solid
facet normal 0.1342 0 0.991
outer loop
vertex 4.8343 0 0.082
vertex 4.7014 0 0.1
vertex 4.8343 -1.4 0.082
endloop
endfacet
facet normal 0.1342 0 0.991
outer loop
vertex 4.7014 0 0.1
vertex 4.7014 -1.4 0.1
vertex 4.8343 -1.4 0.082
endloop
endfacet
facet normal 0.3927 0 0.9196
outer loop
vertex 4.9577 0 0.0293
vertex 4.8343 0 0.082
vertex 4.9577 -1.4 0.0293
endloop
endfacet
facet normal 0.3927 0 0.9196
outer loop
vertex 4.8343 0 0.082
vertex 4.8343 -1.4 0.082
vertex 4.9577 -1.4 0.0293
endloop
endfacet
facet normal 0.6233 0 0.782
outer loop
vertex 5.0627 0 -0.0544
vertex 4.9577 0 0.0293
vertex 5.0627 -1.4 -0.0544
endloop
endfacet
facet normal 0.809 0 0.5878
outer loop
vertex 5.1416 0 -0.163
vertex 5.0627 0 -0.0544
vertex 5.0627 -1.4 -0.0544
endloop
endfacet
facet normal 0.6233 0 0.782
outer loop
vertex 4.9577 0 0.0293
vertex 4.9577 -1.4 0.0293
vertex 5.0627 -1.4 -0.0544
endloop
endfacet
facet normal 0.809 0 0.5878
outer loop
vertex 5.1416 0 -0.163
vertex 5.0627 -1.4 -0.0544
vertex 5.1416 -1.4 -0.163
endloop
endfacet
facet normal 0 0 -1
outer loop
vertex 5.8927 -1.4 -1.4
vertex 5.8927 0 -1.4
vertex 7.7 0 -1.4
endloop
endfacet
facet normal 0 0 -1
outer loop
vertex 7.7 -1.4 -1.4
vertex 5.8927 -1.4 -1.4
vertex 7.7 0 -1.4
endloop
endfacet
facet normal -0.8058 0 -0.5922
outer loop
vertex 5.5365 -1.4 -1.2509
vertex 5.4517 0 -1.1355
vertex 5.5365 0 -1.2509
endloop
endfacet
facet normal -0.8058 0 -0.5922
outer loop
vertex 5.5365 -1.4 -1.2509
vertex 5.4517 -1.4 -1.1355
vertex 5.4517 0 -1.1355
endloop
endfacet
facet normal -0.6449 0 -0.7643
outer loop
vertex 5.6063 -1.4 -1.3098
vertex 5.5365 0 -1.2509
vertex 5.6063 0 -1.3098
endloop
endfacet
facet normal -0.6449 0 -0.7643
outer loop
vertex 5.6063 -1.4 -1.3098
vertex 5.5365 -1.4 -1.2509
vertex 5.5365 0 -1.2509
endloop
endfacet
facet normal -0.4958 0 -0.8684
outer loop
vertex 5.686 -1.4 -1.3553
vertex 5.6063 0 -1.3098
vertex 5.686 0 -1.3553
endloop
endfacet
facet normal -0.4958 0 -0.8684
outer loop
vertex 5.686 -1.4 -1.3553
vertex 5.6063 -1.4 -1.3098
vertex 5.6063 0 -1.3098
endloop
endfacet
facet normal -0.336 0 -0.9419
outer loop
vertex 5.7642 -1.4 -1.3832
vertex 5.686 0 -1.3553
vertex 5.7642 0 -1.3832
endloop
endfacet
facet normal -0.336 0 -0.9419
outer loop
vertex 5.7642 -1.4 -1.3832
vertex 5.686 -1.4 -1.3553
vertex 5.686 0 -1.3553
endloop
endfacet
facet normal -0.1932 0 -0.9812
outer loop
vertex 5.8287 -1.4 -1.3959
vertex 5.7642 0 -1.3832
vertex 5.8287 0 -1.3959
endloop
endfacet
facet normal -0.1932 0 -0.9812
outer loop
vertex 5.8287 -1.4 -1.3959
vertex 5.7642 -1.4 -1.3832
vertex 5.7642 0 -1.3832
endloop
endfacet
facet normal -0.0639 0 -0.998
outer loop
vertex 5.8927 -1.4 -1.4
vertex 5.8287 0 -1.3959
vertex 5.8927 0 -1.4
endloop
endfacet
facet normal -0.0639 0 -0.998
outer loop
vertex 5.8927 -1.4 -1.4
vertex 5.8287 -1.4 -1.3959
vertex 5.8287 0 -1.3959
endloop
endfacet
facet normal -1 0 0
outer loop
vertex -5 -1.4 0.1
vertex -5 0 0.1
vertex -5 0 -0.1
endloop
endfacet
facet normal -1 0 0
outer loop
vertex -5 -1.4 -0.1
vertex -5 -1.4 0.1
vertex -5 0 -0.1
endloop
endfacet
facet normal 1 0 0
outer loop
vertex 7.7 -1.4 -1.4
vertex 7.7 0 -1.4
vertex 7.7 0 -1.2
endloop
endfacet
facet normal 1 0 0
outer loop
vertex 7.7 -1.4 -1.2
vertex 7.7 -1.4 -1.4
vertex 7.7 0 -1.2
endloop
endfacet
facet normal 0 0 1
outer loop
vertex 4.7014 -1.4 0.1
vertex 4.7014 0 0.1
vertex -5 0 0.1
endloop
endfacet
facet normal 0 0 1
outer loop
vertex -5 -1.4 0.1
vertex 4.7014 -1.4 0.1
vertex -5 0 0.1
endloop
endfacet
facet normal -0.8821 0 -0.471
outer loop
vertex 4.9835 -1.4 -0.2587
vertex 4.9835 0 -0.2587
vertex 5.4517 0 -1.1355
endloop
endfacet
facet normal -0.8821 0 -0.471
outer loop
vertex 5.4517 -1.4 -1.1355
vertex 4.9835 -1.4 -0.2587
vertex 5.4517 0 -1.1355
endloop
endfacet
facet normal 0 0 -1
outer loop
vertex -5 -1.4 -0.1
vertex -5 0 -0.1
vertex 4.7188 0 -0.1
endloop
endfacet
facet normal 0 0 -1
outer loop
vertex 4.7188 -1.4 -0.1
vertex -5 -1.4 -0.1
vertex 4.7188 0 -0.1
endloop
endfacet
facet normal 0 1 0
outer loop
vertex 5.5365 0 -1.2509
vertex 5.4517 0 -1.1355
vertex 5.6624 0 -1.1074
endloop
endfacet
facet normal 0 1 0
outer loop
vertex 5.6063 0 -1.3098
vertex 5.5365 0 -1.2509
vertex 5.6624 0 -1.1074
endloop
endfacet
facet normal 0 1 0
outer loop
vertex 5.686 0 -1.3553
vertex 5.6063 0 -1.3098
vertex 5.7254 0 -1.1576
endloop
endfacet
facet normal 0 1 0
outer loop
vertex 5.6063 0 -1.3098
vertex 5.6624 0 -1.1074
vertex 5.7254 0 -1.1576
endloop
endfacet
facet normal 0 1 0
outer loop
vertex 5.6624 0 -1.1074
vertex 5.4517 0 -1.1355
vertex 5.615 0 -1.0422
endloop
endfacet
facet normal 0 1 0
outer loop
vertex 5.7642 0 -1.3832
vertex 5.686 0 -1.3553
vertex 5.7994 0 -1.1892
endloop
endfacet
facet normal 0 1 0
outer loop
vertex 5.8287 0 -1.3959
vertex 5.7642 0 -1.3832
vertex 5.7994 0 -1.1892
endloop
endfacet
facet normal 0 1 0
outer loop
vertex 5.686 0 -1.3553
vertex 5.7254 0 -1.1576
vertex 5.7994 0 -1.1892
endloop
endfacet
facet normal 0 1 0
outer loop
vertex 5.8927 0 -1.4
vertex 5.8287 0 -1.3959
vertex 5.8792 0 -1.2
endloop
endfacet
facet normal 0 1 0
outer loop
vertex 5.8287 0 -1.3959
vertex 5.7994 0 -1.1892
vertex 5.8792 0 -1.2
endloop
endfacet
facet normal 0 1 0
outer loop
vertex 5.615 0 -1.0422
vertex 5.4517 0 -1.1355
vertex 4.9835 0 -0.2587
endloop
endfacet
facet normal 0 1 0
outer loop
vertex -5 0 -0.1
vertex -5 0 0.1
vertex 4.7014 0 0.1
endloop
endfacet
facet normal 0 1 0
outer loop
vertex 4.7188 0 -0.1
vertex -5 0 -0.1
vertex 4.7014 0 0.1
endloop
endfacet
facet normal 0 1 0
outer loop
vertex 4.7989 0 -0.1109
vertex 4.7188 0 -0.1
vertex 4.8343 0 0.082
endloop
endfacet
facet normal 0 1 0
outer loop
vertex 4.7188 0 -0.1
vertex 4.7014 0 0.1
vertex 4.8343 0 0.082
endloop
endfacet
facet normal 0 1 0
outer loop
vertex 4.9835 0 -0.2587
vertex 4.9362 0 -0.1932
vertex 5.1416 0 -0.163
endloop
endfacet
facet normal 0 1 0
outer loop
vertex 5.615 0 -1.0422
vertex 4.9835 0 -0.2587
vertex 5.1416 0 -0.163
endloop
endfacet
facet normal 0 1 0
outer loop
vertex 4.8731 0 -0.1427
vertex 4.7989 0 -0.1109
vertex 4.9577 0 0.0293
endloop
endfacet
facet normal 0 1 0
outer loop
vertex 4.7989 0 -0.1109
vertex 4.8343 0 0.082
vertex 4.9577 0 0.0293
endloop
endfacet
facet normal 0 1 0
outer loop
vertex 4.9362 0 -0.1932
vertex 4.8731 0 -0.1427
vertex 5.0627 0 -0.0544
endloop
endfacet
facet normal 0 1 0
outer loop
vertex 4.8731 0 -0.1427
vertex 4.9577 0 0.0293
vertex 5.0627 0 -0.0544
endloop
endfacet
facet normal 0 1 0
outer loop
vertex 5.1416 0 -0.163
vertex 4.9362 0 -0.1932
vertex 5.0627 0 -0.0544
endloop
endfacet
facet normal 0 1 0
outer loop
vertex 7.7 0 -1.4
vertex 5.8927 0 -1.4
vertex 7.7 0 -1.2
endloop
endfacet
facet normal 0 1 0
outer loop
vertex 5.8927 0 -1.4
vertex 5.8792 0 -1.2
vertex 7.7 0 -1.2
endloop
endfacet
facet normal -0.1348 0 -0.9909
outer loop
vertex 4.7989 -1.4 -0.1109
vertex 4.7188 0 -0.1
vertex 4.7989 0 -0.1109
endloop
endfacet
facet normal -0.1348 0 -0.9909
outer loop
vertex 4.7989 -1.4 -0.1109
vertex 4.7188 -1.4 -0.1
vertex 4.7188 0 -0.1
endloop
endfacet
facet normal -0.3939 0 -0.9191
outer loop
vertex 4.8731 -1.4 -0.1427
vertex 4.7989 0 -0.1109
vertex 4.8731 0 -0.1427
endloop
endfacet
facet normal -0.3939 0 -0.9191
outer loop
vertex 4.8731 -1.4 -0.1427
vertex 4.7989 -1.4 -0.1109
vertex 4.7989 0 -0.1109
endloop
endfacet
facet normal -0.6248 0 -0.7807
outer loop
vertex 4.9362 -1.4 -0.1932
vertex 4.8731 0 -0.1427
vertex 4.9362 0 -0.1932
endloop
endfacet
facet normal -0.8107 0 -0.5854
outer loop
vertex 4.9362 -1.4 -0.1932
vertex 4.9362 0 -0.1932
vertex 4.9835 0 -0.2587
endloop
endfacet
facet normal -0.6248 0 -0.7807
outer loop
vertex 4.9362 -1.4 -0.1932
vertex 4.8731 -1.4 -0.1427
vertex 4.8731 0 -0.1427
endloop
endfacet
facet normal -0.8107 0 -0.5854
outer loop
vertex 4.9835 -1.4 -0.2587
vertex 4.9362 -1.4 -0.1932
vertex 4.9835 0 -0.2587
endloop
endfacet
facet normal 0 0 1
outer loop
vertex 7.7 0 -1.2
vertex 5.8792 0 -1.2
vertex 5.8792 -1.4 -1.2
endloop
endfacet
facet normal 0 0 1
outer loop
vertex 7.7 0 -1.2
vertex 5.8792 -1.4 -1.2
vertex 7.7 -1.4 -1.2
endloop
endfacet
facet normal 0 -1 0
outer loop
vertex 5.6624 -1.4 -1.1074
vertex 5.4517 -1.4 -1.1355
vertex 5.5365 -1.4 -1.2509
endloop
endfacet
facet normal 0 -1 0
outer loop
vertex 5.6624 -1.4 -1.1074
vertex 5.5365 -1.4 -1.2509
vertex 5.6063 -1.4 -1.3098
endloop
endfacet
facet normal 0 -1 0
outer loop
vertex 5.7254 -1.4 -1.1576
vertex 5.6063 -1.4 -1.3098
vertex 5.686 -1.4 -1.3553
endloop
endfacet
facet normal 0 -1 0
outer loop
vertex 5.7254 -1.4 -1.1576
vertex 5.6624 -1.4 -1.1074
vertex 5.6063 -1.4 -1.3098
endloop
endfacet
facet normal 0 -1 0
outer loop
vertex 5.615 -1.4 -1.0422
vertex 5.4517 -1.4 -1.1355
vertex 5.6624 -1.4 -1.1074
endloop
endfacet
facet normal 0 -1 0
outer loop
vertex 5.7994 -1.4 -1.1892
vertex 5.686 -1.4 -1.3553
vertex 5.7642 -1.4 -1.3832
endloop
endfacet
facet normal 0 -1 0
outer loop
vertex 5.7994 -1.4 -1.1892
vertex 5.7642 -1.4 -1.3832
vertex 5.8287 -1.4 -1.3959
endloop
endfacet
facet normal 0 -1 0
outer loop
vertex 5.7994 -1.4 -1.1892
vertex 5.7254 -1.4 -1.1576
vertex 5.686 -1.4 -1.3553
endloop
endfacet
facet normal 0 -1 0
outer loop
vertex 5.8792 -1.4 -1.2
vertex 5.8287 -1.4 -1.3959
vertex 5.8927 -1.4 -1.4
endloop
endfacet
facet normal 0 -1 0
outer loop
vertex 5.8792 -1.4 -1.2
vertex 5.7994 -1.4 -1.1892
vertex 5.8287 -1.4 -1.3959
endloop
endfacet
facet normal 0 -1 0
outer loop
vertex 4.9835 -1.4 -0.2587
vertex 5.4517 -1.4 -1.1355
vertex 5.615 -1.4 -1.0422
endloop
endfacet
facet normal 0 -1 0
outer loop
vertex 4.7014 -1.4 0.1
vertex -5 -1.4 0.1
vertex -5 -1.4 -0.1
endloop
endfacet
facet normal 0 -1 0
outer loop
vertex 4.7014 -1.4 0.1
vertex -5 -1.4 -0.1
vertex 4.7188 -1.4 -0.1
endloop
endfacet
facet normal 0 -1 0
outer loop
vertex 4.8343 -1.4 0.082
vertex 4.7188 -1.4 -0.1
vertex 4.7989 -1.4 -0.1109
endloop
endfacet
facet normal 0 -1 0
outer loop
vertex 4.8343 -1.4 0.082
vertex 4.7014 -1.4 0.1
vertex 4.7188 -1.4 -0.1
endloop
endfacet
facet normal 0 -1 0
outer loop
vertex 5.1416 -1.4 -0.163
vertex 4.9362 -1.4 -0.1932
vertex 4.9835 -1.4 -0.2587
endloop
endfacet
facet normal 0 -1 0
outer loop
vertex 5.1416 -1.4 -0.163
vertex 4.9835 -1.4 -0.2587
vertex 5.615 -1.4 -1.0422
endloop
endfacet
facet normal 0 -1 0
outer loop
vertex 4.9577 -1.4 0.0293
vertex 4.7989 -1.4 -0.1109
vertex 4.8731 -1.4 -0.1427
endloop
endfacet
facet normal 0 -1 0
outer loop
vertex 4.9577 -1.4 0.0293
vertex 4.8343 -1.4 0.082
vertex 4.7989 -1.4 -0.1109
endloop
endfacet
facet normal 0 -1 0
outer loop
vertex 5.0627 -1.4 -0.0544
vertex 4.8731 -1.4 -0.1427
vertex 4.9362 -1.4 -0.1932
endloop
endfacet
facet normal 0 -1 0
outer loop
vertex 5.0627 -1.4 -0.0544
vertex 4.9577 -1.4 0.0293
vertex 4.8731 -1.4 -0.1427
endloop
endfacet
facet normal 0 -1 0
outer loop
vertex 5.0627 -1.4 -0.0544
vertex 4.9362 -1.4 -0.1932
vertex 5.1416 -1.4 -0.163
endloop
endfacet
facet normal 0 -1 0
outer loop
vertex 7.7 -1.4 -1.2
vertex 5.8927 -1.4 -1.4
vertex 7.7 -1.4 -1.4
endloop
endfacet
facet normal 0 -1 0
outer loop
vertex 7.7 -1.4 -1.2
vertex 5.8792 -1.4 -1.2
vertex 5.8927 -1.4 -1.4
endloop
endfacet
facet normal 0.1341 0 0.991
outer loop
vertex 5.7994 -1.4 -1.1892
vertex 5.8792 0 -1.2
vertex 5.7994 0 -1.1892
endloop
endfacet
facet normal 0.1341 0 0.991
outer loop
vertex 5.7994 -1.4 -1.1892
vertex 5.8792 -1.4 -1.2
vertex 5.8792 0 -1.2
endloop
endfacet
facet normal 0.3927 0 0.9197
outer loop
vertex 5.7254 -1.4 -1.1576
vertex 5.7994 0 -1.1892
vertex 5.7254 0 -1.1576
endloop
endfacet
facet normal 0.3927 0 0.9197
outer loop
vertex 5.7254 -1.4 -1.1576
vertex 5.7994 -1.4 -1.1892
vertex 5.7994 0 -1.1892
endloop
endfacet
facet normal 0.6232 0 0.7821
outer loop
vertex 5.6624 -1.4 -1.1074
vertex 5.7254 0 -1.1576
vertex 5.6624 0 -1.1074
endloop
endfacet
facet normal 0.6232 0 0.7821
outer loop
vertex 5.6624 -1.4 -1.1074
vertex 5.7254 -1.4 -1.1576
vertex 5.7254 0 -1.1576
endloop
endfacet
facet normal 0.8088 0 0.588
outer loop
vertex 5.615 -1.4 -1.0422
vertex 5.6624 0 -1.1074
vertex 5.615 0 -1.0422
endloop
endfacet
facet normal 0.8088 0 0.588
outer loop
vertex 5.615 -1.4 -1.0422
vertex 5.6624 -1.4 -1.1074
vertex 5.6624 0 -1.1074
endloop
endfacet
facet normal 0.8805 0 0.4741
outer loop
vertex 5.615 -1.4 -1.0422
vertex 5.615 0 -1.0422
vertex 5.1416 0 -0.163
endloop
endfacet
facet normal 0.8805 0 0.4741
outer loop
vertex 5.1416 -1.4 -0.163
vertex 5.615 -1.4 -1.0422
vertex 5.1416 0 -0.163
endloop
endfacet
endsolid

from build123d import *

# Parameters (mm, degrees)
F0_W     = 2
F0_H     = 0.2
F1_DEPTH = 1.4
F2_R     = 0.3
F3_R     = 0.5


with BuildPart() as f1:
    # F0 (on Front) → F1 (new body)
    with BuildSketch(Plane.XZ):
        Polygon((5, 0.1), (-5, 0.1), (-5, -0.1), (4.898743, -0.1), (5, -0.1), align=None)
        Polygon((5.7, -1.2), (5, 0.1), (5, -0.1), (4.898743, -0.1), (5.592507, -1.399263), (5.7, -1.4), align=None)
        with Locations((6.7, -1.3)):
            Rectangle(F0_W, F0_H)
    extrude(amount=F1_DEPTH)

    # F2
    f2_edges = [f1.edges().sort_by_distance(p)[0] for p in [
        (5.7, -0.7, -1.2),
        (4.898743, -0.7, -0.1),
    ]]
    fillet(f2_edges, radius=F2_R)

    # F3
    f3_edges = [f1.edges().sort_by_distance(p)[0] for p in [
        (5, -0.7, 0.1),
        (5.592507, -0.7, -1.399263),
    ]]
    fillet(f3_edges, radius=F3_R)


solid = f1.part
